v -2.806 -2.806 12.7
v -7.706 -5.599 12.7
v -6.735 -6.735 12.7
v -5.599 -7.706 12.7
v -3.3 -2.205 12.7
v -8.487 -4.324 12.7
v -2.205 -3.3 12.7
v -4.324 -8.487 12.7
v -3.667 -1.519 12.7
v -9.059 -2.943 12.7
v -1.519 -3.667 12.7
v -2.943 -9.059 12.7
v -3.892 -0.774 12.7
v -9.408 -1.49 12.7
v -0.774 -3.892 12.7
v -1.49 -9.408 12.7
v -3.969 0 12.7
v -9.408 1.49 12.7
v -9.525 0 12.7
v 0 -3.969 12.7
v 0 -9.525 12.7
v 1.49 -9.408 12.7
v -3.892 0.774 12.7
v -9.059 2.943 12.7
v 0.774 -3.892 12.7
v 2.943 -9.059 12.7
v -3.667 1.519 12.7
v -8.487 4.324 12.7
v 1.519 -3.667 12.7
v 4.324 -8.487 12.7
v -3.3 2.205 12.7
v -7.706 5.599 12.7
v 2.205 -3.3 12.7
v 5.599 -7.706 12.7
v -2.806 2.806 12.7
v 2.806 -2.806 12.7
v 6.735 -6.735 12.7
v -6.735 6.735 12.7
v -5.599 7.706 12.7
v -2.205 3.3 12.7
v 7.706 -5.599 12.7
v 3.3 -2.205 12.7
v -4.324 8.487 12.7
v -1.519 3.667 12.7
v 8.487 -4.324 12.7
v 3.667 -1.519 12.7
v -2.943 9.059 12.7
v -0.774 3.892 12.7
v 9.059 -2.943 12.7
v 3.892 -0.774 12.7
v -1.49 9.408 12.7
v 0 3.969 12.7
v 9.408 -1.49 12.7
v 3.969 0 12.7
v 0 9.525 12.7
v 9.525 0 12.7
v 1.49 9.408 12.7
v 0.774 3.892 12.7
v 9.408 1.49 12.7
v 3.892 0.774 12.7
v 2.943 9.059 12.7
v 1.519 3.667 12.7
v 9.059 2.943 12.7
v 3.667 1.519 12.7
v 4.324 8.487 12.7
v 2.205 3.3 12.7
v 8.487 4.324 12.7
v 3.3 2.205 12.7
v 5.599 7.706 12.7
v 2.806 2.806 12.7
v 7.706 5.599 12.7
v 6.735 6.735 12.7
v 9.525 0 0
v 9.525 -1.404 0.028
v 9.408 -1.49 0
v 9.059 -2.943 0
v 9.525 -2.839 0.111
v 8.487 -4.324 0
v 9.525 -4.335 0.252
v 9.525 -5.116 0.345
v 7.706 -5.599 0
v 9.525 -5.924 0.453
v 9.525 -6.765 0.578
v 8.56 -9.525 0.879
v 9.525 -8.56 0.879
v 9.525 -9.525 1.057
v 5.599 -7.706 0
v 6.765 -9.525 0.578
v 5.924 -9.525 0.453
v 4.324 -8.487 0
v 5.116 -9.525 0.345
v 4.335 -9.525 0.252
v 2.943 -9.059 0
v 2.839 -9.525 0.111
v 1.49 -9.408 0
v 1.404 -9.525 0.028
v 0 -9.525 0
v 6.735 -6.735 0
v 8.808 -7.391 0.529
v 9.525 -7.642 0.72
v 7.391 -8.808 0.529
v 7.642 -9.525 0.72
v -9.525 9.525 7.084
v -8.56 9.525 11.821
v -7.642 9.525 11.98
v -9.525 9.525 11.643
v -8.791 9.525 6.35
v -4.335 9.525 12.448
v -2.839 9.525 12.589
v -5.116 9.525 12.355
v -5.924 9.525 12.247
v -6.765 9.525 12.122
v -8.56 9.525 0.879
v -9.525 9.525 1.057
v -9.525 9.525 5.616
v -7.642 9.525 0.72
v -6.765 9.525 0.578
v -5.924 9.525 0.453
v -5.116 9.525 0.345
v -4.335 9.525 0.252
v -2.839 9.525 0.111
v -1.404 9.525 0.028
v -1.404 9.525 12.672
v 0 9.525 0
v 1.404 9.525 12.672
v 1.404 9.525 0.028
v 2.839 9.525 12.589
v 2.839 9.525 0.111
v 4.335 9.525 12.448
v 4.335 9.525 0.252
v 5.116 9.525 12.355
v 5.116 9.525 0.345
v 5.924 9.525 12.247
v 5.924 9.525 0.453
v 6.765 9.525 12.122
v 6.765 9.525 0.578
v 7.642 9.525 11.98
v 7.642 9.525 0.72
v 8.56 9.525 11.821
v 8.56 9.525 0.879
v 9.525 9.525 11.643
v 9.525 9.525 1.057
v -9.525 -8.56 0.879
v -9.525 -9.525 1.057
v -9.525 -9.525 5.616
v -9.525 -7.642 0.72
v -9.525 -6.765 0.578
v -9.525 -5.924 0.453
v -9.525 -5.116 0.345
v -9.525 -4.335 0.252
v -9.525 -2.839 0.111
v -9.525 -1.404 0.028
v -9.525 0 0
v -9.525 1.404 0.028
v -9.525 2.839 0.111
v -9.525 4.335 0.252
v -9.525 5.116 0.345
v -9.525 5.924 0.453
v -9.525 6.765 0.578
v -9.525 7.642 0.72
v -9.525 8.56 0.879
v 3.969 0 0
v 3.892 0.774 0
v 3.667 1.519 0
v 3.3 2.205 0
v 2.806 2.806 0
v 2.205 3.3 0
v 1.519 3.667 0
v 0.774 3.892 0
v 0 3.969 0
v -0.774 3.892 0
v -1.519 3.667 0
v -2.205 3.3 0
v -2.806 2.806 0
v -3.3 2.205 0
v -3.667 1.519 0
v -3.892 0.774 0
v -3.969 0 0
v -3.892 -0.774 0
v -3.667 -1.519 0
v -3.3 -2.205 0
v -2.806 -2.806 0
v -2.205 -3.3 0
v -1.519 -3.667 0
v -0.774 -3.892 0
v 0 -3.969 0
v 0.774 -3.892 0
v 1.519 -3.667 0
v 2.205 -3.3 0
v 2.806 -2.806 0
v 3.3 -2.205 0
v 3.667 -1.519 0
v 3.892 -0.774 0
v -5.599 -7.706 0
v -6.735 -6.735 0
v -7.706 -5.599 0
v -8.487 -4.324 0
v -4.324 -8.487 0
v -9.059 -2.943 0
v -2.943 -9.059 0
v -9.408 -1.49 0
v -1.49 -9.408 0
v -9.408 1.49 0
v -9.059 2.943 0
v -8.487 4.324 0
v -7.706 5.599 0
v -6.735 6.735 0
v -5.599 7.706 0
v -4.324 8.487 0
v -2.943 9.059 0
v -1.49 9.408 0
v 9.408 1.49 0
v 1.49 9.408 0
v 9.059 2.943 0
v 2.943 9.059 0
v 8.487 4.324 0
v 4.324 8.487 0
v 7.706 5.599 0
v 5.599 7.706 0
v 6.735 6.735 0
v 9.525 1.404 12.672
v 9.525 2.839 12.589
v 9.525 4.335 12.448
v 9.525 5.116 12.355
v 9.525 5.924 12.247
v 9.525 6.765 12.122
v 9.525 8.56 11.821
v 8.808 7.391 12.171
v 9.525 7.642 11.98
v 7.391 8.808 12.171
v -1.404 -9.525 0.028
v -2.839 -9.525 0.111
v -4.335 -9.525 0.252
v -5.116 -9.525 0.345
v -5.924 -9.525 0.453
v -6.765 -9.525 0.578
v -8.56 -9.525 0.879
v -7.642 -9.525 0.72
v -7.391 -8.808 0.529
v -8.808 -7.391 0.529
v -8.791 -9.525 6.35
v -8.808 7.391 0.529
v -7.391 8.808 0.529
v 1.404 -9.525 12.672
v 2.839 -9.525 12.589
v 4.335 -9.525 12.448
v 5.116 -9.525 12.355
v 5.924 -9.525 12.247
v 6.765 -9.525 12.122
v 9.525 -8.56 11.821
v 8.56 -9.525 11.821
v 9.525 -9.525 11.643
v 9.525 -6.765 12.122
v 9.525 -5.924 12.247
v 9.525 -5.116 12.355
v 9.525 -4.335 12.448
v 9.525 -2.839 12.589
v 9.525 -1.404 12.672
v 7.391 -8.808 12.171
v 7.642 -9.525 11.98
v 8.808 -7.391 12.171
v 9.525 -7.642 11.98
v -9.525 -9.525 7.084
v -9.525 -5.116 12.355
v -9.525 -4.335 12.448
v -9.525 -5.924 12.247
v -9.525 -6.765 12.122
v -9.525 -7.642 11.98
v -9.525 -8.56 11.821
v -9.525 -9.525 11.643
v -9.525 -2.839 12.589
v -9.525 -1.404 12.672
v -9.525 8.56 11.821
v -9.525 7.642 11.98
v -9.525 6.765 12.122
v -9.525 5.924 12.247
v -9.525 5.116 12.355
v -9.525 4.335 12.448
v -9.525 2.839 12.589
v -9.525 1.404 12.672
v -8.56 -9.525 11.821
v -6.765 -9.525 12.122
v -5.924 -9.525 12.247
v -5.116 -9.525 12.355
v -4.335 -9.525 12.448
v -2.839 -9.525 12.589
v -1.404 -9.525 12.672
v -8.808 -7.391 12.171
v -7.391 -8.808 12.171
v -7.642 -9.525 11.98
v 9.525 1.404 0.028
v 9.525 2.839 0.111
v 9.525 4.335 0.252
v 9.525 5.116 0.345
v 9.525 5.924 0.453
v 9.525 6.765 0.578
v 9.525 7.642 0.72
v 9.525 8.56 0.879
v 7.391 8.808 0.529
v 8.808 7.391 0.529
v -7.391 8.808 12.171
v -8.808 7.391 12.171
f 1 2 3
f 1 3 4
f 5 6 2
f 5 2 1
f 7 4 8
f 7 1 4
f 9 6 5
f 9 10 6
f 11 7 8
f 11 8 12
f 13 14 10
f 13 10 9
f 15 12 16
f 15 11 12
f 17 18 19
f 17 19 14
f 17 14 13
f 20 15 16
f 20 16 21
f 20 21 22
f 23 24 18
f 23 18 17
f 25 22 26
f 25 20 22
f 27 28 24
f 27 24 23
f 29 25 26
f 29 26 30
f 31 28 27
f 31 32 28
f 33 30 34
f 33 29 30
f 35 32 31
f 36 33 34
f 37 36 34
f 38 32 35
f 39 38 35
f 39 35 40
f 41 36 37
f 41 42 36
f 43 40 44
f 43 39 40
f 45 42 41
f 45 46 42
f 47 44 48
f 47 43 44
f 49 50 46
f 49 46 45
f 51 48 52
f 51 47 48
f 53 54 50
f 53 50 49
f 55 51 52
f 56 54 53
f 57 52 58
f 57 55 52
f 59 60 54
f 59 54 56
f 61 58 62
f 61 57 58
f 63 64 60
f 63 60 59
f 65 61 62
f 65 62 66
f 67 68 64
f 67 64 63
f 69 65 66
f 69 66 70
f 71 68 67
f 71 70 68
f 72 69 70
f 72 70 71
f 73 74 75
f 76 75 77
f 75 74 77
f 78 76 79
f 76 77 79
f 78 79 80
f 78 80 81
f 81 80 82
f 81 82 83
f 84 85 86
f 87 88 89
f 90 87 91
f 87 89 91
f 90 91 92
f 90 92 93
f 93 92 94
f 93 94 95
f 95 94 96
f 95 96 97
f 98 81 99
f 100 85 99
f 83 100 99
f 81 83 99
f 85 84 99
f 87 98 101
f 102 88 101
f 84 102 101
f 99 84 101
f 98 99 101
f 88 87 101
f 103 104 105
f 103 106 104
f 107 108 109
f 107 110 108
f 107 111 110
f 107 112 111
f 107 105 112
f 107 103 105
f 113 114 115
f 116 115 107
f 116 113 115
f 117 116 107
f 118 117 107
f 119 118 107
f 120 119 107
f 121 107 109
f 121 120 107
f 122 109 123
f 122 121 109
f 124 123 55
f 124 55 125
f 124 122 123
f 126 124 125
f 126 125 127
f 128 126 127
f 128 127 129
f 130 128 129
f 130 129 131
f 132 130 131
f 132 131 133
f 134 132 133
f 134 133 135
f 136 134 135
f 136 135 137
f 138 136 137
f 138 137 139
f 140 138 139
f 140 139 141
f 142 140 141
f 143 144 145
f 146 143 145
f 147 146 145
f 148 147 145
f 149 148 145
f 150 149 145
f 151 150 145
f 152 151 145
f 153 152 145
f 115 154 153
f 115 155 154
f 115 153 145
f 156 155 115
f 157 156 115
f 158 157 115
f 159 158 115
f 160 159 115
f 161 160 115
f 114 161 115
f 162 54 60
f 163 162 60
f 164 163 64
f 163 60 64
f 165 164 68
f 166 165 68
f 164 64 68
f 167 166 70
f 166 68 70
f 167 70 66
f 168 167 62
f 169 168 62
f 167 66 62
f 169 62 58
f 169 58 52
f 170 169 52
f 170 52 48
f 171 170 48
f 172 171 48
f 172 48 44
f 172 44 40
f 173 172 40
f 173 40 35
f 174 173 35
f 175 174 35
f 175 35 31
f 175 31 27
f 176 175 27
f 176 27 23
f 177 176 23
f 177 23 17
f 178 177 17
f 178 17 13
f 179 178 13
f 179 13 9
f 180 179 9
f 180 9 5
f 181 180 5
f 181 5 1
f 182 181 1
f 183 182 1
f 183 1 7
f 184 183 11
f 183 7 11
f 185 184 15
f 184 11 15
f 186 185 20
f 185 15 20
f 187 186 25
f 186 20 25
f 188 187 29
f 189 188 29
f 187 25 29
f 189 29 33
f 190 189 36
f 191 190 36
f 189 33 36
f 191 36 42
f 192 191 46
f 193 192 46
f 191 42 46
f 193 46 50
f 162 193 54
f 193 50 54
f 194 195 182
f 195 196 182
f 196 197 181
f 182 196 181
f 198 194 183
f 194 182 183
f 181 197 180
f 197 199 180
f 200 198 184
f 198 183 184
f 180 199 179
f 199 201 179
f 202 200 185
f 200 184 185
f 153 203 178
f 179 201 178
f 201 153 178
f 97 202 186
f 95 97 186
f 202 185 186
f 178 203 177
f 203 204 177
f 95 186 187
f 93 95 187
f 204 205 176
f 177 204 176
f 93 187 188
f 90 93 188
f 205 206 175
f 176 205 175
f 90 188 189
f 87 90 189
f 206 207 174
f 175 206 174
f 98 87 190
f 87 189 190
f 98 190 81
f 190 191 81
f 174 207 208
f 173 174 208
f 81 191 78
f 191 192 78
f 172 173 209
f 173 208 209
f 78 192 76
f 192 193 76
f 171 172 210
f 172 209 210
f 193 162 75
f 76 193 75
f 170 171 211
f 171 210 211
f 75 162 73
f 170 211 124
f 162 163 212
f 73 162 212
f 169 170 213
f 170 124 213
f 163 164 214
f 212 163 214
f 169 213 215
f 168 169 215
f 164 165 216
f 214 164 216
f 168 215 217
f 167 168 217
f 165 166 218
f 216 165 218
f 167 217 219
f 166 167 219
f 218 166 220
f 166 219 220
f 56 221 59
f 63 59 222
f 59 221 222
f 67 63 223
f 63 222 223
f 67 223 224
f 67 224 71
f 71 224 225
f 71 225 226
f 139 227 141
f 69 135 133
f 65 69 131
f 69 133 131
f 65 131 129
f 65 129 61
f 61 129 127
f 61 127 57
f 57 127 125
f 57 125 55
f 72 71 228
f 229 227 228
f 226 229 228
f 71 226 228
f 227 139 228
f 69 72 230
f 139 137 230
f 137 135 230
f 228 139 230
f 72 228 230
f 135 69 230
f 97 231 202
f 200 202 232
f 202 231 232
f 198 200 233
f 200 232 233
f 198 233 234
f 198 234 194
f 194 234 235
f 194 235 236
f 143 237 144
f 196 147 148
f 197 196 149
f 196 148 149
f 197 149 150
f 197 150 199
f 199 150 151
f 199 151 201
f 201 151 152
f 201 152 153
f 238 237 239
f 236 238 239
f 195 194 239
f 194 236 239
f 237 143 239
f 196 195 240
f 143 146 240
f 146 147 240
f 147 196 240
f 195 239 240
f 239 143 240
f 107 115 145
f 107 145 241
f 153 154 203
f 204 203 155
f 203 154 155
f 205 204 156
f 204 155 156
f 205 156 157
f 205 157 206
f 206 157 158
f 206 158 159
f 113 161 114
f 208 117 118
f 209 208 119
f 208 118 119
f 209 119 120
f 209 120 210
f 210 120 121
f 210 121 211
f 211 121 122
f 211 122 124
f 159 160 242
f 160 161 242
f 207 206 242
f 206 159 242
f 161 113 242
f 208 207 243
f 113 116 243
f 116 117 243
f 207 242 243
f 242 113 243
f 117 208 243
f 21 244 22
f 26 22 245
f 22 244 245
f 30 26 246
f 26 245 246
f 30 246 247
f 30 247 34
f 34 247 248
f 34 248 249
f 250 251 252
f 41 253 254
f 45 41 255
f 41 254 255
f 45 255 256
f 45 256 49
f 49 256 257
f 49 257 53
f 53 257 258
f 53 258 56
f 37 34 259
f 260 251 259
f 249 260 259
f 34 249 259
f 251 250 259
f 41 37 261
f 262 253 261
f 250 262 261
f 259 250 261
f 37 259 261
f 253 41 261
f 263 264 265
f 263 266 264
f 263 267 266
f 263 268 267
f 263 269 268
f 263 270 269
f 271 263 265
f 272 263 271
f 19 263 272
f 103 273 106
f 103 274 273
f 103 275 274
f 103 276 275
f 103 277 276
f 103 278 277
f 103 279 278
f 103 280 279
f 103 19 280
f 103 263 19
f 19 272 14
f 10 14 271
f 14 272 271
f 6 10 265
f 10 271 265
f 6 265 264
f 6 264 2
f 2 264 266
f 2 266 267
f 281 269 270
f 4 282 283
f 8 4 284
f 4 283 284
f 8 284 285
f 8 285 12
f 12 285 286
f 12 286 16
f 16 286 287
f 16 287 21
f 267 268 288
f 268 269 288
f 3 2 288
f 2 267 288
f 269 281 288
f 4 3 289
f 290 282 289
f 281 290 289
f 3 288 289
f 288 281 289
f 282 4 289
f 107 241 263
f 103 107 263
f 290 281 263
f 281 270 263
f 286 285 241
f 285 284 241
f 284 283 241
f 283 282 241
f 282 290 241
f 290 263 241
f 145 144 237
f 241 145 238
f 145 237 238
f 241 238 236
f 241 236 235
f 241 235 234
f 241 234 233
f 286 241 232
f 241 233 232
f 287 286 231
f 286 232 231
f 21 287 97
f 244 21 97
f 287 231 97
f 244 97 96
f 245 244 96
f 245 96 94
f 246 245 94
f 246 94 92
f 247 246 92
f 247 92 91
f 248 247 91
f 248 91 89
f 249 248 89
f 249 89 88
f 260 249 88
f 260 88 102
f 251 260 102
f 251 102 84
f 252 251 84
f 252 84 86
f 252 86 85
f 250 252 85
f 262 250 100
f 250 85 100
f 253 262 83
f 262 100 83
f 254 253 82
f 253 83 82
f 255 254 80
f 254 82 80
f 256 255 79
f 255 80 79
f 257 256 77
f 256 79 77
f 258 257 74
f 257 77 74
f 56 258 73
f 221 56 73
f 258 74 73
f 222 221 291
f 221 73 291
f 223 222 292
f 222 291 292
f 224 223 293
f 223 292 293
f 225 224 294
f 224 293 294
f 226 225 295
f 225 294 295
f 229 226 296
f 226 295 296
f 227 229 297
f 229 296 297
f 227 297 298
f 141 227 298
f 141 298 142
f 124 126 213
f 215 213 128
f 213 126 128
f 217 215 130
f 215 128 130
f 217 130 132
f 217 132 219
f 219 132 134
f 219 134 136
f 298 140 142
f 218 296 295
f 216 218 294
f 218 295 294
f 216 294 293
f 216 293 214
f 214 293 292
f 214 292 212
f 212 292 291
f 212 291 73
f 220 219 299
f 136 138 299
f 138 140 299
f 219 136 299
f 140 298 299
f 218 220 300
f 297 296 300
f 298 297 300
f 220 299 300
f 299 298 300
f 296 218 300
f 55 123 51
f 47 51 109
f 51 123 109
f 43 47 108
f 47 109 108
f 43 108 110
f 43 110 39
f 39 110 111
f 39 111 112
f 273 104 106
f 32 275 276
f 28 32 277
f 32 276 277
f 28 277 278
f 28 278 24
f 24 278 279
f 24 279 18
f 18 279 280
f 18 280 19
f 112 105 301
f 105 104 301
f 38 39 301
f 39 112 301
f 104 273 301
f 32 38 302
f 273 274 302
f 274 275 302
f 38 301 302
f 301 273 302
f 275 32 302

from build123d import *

# Parameters (mm, degrees)
F0_W      = 19.05
F0_H      = 19.05
F1_DEPTH  = 12.7
F2_R      = 3.96875
F3_DEPTH  = 12.701
F10_DEPTH = 12.7


with BuildPart() as f1:
    # F0 (on Top) → F1 (new body)
    with BuildSketch(Plane.XY):
        Rectangle(F0_W, F0_H)
    extrude(amount=F1_DEPTH)

    # F2 (on face) → F3 (cut, through all)
    with BuildSketch(Plane.XY.offset(12.7)):
        Circle(F2_R)
    extrude(amount=-F3_DEPTH, mode=Mode.SUBTRACT)

    # F4 (on Right) → F5 (revolve, cut)
    with BuildSketch(Plane.YZ):
        Polygon((24.765, 12.7), (9.525, 12.7), (24.765, 8.6164543073), align=None)
    revolve(axis=Axis((0, 0, 12.7), (0, 0, 1)), mode=Mode.SUBTRACT)

    # F7 (on Right) → F8 (revolve, cut)
    with BuildSketch(Plane.YZ):
        Polygon((-22.8305501432, 0), (-9.525, 0), (-22.8305501432, 3.5652114157), align=None)
    revolve(axis=Axis((0, 0, 0), (0, 0, -1)), mode=Mode.SUBTRACT)

    # F9 (on Front) → F10 (cut, symmetric)
    with BuildSketch(Plane.XZ):
        Polygon((-8.7912914261, 6.35), (-9.525, 6.35), (-9.525, 5.6162914261), align=None)
        Polygon((-8.7912914261, 6.35), (-9.525, 7.0837085739), (-9.525, 6.35), align=None)
    extrude(amount=F10_DEPTH, both=True, mode=Mode.SUBTRACT)


solid = f1.part
